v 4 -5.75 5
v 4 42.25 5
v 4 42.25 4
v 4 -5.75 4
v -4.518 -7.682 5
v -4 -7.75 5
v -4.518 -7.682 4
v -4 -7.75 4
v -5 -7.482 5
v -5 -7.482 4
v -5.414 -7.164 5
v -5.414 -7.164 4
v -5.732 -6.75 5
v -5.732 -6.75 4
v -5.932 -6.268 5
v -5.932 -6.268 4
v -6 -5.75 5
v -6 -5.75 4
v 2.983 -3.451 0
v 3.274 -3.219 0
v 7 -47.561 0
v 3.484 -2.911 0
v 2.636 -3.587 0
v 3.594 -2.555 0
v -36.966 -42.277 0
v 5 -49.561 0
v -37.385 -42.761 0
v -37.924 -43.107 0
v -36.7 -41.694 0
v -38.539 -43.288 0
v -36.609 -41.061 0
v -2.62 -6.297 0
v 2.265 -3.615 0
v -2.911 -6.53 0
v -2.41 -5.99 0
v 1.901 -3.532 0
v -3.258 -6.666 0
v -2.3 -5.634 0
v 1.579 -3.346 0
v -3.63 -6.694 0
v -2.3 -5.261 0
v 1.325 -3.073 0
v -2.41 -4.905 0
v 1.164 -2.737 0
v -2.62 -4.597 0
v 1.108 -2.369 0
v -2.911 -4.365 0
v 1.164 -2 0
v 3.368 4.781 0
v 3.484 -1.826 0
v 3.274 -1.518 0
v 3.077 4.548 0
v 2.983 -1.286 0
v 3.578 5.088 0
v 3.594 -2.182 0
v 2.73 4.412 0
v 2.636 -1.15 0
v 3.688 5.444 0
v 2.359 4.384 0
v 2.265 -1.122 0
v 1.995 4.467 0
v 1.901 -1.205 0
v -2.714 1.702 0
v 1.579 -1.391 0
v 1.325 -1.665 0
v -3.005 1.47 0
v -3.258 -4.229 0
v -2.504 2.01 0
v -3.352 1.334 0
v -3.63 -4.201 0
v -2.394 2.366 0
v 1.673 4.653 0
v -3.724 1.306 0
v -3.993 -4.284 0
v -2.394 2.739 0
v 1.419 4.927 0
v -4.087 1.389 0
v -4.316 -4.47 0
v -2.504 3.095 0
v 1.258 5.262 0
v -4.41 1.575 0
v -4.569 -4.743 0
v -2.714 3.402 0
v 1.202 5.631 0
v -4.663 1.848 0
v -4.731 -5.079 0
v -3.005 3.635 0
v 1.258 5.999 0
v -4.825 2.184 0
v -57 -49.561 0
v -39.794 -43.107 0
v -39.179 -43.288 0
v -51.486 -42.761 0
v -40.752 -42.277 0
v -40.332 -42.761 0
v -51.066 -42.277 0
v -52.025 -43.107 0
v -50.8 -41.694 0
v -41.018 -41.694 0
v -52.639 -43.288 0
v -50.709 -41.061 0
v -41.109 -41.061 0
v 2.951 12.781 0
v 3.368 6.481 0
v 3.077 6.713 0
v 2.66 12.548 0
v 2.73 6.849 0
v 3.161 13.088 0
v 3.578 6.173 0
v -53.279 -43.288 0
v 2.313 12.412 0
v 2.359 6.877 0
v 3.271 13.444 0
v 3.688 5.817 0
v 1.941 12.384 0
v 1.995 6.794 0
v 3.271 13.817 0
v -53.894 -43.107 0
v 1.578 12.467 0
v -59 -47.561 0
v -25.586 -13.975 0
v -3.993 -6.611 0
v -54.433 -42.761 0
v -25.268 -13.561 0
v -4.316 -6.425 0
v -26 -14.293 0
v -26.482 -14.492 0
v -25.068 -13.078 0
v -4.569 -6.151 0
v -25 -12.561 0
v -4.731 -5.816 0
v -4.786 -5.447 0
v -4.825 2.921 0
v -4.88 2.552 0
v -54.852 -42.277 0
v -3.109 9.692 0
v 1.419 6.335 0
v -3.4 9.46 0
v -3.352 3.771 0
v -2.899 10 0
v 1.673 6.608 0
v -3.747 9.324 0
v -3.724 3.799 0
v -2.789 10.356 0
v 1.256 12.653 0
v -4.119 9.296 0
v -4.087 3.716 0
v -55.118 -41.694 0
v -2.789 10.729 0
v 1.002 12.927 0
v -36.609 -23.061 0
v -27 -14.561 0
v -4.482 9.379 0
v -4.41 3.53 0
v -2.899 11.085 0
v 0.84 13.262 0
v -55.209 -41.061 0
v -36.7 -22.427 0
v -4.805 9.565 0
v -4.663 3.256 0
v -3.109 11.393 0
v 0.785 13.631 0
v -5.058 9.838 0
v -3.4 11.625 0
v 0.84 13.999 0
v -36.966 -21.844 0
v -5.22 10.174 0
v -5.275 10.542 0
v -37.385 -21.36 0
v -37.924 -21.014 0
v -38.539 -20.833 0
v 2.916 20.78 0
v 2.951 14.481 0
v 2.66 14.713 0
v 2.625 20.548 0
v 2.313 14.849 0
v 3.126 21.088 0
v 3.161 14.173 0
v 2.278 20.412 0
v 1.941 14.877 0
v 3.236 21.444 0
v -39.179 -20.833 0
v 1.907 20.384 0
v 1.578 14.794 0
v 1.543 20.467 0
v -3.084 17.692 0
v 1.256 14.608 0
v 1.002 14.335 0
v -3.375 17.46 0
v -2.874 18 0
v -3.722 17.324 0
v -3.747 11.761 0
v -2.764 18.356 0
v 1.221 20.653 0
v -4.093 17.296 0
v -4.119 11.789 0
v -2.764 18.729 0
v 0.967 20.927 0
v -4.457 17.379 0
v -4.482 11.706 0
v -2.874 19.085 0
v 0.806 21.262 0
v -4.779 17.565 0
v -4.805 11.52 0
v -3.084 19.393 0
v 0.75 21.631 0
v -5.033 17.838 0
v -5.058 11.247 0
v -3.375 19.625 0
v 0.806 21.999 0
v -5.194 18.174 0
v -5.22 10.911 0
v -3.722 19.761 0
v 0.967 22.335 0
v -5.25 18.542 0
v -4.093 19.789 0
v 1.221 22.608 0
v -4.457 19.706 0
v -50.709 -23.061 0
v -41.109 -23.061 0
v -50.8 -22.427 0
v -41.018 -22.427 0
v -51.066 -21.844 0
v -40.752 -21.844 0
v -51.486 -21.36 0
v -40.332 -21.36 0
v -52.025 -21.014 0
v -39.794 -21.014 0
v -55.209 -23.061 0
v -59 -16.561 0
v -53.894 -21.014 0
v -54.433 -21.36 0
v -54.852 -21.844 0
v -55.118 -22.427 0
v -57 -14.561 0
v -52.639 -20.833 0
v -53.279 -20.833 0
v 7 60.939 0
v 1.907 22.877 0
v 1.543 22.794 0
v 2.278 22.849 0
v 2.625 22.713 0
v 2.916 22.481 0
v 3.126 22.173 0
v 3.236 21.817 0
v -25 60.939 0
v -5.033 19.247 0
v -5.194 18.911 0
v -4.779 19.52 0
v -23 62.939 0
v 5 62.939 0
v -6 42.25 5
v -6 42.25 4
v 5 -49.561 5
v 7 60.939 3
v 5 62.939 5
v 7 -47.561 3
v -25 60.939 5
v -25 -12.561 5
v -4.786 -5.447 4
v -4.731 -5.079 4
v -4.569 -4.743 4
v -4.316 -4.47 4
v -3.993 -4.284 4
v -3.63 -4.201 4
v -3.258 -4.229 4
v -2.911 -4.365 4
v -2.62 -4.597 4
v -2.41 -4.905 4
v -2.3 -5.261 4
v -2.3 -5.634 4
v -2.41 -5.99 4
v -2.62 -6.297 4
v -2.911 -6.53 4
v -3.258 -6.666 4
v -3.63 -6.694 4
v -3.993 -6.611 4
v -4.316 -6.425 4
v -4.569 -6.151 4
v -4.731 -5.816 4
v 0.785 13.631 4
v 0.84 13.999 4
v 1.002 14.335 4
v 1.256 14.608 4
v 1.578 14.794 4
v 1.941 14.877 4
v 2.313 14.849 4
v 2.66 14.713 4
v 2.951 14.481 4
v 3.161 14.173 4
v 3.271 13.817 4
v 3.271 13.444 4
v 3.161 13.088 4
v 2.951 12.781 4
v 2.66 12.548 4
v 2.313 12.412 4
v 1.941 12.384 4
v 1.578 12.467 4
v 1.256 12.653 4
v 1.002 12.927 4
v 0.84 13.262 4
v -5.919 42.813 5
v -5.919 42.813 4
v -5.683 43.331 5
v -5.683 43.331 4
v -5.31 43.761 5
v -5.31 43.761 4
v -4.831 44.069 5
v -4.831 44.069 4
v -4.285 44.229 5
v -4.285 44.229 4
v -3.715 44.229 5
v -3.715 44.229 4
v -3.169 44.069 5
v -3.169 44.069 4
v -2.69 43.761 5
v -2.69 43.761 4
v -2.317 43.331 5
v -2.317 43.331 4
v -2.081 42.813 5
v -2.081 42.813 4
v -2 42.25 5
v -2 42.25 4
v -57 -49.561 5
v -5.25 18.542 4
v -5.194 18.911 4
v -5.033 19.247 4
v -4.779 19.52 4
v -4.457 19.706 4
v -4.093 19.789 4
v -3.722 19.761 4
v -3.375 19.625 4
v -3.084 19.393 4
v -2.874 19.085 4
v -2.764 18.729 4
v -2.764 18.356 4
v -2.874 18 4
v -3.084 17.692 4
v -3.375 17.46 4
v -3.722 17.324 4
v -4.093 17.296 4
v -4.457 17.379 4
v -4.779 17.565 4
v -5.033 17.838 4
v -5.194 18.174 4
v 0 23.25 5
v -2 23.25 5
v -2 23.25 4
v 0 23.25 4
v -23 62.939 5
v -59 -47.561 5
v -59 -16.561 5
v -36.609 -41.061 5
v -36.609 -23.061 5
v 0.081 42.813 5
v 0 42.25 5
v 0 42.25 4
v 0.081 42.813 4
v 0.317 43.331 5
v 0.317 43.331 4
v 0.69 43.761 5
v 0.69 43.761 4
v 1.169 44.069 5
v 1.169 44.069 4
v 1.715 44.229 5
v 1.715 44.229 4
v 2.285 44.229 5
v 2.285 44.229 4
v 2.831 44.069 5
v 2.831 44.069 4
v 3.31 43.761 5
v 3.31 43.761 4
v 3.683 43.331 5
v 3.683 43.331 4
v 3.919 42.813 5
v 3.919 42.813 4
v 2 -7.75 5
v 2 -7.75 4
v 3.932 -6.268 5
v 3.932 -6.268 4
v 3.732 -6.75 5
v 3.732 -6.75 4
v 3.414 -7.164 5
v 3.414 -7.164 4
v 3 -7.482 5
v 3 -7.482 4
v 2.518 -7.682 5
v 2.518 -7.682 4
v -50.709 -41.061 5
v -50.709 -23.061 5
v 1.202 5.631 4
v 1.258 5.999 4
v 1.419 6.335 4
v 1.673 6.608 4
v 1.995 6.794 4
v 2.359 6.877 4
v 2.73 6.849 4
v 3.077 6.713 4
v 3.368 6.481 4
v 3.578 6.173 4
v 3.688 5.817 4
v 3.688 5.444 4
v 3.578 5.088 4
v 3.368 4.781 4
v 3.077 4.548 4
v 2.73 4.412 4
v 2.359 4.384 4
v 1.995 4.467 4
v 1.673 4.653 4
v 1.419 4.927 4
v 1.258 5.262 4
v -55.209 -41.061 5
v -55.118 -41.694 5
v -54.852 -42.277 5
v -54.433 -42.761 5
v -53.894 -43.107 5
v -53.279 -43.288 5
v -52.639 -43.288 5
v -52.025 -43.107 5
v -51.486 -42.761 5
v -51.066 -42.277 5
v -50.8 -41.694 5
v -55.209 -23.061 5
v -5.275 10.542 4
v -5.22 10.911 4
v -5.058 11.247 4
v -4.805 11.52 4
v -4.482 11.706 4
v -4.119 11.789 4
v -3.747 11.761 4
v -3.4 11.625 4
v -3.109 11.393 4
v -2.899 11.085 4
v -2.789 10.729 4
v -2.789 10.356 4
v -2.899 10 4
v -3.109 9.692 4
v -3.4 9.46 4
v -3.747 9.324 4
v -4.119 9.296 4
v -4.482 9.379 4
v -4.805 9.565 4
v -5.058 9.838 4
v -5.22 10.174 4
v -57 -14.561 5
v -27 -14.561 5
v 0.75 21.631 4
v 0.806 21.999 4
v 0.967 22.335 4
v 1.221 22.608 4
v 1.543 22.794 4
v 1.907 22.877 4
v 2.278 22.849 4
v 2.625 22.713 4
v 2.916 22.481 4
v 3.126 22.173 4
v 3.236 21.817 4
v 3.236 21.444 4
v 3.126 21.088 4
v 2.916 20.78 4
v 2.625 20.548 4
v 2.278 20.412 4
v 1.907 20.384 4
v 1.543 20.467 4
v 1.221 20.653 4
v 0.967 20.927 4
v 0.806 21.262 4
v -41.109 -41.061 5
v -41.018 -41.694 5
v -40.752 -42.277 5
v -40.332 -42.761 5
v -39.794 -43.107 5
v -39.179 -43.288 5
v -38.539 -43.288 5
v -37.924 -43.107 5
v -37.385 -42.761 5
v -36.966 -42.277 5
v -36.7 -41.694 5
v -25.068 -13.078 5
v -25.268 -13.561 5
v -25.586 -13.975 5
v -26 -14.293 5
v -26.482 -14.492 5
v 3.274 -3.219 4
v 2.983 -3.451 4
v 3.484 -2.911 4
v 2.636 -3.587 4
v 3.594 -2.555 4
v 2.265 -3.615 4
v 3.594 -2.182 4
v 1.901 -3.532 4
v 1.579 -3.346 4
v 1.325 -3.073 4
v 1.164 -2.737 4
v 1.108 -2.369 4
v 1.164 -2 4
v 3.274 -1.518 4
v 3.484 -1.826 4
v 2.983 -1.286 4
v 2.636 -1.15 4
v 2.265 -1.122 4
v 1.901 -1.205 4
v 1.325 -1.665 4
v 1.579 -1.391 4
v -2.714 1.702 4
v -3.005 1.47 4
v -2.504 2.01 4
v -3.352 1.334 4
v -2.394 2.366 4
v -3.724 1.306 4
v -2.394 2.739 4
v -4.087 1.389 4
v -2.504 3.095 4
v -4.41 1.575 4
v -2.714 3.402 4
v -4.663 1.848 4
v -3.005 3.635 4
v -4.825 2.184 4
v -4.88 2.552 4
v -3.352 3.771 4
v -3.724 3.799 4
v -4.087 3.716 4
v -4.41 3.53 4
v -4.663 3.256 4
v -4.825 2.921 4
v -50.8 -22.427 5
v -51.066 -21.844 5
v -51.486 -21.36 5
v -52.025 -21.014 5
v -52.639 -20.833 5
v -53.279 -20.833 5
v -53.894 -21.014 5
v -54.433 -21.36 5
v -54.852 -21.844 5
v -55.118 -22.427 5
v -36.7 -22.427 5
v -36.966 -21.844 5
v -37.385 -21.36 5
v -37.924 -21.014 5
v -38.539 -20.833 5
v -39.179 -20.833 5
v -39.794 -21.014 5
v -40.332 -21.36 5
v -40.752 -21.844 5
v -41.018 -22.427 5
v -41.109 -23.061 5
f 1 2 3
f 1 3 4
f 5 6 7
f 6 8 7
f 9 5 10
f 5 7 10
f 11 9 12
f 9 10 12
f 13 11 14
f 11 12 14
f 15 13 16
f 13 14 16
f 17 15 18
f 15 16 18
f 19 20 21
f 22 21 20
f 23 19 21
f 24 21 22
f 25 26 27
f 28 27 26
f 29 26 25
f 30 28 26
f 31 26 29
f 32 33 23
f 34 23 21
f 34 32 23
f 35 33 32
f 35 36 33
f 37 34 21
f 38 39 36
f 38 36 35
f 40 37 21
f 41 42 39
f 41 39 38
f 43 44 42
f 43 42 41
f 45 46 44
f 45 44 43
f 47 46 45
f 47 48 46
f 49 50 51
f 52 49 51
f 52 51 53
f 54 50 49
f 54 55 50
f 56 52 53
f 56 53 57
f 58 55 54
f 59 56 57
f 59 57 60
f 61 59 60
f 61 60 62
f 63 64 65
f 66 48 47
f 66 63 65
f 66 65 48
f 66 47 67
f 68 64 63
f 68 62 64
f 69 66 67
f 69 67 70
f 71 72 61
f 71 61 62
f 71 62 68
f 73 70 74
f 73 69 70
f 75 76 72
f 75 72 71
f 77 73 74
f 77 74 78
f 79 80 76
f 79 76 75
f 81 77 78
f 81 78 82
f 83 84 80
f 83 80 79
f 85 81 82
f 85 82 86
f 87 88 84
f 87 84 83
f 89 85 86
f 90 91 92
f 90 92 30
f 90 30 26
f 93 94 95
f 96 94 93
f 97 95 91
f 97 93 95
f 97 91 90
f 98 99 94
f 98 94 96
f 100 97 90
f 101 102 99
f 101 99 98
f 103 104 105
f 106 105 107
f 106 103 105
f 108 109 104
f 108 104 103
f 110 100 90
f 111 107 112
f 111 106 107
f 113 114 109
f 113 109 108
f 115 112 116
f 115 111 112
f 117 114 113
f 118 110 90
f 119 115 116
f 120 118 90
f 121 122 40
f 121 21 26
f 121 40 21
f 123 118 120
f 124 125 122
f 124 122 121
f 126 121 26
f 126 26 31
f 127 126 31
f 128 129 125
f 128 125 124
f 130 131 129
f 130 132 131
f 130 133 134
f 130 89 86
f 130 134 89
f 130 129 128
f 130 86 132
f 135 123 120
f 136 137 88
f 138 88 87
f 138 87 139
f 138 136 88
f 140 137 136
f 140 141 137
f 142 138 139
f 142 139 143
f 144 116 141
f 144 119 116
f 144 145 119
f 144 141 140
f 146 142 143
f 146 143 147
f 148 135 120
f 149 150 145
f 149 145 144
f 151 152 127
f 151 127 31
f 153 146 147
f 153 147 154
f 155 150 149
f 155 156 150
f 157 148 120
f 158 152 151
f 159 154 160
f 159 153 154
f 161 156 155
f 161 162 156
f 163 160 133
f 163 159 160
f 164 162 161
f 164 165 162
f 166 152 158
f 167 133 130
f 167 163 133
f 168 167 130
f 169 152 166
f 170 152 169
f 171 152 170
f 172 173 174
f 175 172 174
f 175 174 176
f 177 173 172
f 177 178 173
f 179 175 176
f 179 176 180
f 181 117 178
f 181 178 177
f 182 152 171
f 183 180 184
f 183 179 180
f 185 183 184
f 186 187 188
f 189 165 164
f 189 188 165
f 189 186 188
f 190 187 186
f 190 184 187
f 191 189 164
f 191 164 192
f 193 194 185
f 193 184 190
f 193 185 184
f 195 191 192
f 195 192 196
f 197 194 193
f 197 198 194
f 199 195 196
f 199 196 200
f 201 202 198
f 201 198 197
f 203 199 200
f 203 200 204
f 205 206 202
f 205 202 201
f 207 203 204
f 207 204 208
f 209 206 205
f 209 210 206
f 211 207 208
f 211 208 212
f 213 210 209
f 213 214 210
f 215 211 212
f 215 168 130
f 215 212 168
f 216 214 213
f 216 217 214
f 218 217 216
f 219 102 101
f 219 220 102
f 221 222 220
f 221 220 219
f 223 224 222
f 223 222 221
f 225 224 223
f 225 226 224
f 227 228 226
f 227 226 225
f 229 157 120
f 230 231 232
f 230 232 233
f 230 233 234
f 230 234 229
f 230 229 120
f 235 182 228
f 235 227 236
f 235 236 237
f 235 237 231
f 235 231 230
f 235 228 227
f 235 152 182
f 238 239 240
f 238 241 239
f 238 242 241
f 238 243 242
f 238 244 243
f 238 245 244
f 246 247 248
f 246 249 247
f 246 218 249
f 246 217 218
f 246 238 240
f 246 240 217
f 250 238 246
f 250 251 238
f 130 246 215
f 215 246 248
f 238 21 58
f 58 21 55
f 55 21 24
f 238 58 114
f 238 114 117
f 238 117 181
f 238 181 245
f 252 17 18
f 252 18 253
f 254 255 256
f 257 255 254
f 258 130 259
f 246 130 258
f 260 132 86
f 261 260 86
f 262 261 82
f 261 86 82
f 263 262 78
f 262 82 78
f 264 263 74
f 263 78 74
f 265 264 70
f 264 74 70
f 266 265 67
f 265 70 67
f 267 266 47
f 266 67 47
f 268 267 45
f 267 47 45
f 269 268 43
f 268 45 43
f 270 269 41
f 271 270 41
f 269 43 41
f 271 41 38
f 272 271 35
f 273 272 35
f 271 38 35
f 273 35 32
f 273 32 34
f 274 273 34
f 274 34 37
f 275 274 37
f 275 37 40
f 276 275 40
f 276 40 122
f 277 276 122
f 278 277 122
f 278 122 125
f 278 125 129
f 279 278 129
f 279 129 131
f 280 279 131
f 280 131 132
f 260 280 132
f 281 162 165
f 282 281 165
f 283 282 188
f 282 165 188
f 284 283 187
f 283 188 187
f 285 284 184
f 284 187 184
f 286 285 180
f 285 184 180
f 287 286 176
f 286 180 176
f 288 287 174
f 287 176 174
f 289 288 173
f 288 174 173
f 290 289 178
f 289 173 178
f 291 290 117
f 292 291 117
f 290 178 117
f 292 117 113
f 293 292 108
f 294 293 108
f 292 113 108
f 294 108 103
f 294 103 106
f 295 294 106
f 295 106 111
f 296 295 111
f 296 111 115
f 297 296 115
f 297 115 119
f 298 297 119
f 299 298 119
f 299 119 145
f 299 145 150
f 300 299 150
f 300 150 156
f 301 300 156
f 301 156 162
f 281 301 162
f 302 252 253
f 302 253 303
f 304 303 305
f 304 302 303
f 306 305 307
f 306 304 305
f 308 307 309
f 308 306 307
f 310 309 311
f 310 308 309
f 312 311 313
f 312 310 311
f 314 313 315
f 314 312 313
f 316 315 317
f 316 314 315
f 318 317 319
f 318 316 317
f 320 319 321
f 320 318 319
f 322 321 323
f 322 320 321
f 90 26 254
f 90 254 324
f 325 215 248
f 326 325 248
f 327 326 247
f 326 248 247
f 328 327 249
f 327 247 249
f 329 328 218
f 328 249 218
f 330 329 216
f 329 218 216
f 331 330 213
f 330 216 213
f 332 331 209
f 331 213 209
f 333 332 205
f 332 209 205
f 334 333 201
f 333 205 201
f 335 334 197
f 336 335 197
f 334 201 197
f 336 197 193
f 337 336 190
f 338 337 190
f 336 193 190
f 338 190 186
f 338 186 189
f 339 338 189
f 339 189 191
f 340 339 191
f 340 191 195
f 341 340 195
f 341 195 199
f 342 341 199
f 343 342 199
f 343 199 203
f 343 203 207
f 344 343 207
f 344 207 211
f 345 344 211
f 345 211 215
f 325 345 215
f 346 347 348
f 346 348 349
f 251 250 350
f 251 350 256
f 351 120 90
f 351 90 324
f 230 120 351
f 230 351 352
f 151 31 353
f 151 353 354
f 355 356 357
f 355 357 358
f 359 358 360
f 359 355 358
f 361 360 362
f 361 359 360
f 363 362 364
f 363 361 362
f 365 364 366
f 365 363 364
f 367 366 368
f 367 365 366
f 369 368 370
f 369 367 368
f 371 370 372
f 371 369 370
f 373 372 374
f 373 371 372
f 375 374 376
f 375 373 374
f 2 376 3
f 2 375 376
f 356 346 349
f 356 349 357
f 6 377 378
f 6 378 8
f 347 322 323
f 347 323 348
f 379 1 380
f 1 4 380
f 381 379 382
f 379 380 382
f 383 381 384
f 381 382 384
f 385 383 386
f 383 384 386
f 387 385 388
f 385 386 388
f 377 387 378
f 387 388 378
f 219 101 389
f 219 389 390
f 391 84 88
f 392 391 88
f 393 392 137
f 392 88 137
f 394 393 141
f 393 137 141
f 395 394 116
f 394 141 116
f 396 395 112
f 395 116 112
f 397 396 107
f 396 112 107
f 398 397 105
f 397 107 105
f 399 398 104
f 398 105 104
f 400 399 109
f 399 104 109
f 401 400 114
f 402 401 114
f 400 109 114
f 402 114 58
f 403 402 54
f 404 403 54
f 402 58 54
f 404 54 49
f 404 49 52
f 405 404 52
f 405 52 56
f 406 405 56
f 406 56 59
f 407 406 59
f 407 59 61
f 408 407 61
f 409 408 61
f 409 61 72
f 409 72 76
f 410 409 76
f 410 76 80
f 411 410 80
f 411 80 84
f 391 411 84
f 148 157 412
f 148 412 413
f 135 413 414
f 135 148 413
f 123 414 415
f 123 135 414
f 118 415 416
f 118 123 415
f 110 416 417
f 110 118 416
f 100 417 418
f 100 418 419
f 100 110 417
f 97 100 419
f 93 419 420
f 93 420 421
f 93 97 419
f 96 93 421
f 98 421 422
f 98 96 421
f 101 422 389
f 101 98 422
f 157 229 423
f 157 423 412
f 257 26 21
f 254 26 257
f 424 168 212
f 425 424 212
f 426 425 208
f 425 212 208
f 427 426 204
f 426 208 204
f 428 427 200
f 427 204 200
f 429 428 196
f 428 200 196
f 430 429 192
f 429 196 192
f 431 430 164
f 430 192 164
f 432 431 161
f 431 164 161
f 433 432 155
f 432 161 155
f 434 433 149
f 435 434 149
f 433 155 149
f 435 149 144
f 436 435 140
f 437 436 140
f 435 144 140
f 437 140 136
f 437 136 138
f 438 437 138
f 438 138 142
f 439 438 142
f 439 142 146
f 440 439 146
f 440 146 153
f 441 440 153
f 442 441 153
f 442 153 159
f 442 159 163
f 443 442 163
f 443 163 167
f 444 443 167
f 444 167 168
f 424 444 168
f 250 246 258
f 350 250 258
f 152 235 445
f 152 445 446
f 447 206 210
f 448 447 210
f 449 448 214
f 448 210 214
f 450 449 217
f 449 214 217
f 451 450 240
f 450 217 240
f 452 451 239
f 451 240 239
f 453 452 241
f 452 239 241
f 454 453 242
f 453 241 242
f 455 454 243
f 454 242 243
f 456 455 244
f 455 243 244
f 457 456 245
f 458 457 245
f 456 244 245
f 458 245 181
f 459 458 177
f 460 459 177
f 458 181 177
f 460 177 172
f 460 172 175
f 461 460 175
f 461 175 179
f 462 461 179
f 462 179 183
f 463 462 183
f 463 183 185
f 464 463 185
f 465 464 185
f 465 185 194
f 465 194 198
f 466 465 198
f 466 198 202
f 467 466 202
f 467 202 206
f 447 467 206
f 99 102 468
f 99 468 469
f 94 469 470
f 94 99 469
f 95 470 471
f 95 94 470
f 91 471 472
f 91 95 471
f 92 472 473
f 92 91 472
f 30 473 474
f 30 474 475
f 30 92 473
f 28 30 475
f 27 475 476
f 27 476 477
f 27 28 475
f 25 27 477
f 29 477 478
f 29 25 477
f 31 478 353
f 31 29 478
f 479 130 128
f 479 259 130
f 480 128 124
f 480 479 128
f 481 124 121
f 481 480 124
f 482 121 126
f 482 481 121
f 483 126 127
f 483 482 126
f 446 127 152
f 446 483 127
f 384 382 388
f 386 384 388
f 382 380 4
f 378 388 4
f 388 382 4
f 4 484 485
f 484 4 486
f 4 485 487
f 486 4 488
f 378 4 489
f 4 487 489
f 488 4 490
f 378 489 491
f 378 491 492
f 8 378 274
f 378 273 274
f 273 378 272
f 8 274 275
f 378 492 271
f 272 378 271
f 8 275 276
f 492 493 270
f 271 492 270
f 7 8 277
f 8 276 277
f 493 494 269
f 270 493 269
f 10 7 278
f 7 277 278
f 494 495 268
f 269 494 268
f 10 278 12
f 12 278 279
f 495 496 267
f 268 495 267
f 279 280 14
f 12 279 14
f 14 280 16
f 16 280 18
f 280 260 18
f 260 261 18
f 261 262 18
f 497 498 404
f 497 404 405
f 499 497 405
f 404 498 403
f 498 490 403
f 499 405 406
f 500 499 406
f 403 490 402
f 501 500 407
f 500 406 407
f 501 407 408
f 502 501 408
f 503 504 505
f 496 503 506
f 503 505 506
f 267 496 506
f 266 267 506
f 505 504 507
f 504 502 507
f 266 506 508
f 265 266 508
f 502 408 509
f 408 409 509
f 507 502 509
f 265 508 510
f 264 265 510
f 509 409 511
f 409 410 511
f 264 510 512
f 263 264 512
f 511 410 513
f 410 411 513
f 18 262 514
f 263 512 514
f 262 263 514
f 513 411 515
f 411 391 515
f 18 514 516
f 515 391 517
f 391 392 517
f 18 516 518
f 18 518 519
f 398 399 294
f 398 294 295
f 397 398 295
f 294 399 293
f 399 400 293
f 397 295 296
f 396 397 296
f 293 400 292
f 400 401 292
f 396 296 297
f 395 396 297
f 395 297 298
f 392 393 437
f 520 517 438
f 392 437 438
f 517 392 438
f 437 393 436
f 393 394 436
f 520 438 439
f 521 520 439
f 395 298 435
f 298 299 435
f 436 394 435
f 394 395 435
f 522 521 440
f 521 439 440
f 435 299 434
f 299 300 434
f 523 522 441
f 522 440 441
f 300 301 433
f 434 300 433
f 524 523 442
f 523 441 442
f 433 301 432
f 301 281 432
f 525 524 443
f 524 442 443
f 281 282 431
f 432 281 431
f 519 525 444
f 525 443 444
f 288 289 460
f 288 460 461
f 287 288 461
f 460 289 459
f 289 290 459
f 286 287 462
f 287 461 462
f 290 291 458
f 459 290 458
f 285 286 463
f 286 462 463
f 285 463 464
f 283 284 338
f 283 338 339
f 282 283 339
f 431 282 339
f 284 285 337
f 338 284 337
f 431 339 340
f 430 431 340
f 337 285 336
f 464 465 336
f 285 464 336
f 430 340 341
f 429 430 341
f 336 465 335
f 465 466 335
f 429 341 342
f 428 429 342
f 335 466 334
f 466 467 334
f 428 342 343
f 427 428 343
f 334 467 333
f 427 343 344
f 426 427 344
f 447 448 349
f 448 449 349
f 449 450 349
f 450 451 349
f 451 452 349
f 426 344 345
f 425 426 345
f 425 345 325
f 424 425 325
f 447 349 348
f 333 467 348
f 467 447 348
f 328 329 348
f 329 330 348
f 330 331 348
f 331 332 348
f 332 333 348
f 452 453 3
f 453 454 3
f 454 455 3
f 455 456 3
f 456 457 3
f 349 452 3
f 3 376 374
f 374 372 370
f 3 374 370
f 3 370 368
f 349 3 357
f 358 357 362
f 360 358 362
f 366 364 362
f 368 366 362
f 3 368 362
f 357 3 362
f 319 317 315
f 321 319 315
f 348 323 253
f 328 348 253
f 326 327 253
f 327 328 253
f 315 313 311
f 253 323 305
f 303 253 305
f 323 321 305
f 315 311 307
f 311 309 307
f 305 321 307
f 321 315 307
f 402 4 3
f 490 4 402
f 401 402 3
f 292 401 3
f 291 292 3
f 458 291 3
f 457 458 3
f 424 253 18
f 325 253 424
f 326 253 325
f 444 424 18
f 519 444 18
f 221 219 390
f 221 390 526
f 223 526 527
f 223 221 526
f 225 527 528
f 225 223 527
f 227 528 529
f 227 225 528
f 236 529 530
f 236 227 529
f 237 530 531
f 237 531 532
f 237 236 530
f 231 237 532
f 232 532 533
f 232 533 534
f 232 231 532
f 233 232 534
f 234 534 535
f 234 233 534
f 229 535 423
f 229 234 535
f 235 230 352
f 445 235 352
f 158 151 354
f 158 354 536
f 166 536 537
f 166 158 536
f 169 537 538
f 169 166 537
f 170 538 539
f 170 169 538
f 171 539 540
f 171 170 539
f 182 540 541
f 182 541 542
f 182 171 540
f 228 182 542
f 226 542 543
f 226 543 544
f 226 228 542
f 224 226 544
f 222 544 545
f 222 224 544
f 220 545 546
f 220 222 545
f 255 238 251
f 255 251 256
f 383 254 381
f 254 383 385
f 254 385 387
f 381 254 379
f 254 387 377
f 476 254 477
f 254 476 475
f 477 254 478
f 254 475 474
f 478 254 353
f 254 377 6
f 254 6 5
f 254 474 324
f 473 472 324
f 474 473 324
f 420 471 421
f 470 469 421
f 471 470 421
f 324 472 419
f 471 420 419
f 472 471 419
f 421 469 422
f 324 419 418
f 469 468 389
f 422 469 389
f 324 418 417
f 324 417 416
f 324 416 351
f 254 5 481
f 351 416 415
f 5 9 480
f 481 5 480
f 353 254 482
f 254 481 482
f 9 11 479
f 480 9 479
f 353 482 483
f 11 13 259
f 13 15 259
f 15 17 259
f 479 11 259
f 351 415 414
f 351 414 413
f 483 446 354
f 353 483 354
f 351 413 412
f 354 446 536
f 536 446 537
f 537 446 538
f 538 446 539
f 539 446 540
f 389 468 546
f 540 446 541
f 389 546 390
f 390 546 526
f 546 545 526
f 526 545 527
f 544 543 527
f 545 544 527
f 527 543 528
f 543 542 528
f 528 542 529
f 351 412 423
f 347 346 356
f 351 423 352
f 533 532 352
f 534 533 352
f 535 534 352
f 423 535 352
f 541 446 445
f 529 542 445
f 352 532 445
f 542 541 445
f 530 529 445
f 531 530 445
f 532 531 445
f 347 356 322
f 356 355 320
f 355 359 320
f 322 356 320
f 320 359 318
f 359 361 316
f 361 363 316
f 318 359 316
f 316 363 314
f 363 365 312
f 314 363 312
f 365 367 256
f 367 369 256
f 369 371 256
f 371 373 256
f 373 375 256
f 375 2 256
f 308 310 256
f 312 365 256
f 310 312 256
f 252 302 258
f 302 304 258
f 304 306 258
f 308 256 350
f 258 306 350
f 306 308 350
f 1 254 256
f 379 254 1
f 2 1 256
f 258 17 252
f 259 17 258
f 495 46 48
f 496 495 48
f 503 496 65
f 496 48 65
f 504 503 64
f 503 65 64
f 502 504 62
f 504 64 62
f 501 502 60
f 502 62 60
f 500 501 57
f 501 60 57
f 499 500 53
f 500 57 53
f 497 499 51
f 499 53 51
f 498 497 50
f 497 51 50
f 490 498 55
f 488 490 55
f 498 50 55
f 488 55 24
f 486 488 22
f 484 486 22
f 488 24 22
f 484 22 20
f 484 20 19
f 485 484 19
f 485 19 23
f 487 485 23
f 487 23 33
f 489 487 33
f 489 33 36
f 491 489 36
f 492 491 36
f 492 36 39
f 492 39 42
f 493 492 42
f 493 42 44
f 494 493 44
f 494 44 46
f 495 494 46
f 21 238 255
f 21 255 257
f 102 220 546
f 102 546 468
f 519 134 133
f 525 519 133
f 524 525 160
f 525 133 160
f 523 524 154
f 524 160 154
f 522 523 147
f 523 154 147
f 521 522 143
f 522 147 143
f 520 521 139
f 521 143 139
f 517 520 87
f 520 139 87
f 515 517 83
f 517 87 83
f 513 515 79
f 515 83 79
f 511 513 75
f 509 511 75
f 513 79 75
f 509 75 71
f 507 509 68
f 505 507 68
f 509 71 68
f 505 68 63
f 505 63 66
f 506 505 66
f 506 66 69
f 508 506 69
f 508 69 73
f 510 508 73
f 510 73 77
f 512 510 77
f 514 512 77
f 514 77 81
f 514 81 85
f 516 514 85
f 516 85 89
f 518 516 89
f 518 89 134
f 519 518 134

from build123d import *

# Parameters (mm, degrees)
BOSS_EXTRUDE1_DEPTH   = 5
CUT_EXTRUDE1_DEPTH    = 1
FILLET1_R             = 2
M3X0_5_TAPPED_HOLE1_D = 2.5
CHAMFER1_SIZE         = 2
FILLET2_R             = 2


with BuildPart() as part:
    # Sketch1 → Boss-Extrude1 (new body)
    with BuildSketch(Plane.XY):
        Polygon((-25, 62.939446367), (7, 62.939446367), (7, -49.560553633), (-59, -49.560553633), (-59, -14.560553633), (-25, -14.560553633), align=None)
        with BuildLine():
            Line((-55.209251079, -23.060553633), (-55.209251079, -41.060553633))
            ThreePointArc((-55.209251079, -41.060553633), (-52.959251079, -43.310553633), (-50.709251079, -41.060553633))
            Line((-50.709251079, -41.060553633), (-50.709251079, -23.060553633))
            ThreePointArc((-50.709251079, -23.060553633), (-52.959251079, -20.810553633), (-55.209251079, -23.060553633))
        make_face(mode=Mode.SUBTRACT)
        with BuildLine():
            Line((-41.108819931, -23.060553633), (-41.108819931, -41.060553633))
            ThreePointArc((-41.108819931, -41.060553633), (-38.858819931, -43.310553633), (-36.608819931, -41.060553633))
            Line((-36.608819931, -41.060553633), (-36.608819931, -23.060553633))
            ThreePointArc((-36.608819931, -23.060553633), (-38.858819931, -20.810553633), (-41.108819931, -23.060553633))
        make_face(mode=Mode.SUBTRACT)
    extrude(amount=BOSS_EXTRUDE1_DEPTH)

    # Sketch5 → Cut-Extrude1 (cut)
    with BuildSketch(Plane.XY.offset(5)):
        with BuildLine():
            Line((-2, 42.249819041), (-2, 23.249819041))
            Line((-2, 23.249819041), (0, 23.249819041))
            Line((0, 23.249819041), (0, 42.249819041))
            ThreePointArc((0, 42.249819041), (2, 44.249819041), (4, 42.249819041))
            Line((4, 42.249819041), (4, -7.750180959))
            Line((4, -7.750180959), (-6, -7.750180959))
            Line((-6, -7.750180959), (-6, 42.249819041))
            ThreePointArc((-6, 42.249819041), (-4, 44.249819041), (-2, 42.249819041))
        make_face()
    extrude(amount=-CUT_EXTRUDE1_DEPTH, mode=Mode.SUBTRACT)

    # Fillet1
    fillet1_edges = [part.edges().sort_by_distance(p)[0] for p in [
        (4, -7.750180959, 4.5),
        (-6, -7.750180959, 4.5),
    ]]
    fillet(fillet1_edges, radius=FILLET1_R)

    # M3x0.5 Tapped Hole1 (through all)
    with Locations(Plane.XY.offset(4)):
        with Locations((-4, 18.542431445), (2, 21.630678546), (2.034899716, 13.630754671), (-4.025360665, 10.542471642), (2.452029153, 5.630754671), (-3.630206533, 2.552236776), (2.358171393, -2.36869473), (-3.536291388, -5.447211951)):
            Hole(M3X0_5_TAPPED_HOLE1_D / 2)

    # Chamfer1
    chamfer1_edges = [part.edges().sort_by_distance(p)[0] for p in [
        (-25, 62.939446367, 2.5),
        (7, 62.939446367, 2.5),
        (7, -49.560553633, 2.5),
        (-59, -49.560553633, 2.5),
        (-59, -14.560553633, 2.5),
        (7, 6.689446367, 5),
    ]]
    chamfer(chamfer1_edges, length=CHAMFER1_SIZE)

    # Fillet2
    fillet2_edges = [part.edges().sort_by_distance(p)[0] for p in [
        (-25, -14.560553633, 2.5),
    ]]
    fillet(fillet2_edges, radius=FILLET2_R)


solid = part.part
